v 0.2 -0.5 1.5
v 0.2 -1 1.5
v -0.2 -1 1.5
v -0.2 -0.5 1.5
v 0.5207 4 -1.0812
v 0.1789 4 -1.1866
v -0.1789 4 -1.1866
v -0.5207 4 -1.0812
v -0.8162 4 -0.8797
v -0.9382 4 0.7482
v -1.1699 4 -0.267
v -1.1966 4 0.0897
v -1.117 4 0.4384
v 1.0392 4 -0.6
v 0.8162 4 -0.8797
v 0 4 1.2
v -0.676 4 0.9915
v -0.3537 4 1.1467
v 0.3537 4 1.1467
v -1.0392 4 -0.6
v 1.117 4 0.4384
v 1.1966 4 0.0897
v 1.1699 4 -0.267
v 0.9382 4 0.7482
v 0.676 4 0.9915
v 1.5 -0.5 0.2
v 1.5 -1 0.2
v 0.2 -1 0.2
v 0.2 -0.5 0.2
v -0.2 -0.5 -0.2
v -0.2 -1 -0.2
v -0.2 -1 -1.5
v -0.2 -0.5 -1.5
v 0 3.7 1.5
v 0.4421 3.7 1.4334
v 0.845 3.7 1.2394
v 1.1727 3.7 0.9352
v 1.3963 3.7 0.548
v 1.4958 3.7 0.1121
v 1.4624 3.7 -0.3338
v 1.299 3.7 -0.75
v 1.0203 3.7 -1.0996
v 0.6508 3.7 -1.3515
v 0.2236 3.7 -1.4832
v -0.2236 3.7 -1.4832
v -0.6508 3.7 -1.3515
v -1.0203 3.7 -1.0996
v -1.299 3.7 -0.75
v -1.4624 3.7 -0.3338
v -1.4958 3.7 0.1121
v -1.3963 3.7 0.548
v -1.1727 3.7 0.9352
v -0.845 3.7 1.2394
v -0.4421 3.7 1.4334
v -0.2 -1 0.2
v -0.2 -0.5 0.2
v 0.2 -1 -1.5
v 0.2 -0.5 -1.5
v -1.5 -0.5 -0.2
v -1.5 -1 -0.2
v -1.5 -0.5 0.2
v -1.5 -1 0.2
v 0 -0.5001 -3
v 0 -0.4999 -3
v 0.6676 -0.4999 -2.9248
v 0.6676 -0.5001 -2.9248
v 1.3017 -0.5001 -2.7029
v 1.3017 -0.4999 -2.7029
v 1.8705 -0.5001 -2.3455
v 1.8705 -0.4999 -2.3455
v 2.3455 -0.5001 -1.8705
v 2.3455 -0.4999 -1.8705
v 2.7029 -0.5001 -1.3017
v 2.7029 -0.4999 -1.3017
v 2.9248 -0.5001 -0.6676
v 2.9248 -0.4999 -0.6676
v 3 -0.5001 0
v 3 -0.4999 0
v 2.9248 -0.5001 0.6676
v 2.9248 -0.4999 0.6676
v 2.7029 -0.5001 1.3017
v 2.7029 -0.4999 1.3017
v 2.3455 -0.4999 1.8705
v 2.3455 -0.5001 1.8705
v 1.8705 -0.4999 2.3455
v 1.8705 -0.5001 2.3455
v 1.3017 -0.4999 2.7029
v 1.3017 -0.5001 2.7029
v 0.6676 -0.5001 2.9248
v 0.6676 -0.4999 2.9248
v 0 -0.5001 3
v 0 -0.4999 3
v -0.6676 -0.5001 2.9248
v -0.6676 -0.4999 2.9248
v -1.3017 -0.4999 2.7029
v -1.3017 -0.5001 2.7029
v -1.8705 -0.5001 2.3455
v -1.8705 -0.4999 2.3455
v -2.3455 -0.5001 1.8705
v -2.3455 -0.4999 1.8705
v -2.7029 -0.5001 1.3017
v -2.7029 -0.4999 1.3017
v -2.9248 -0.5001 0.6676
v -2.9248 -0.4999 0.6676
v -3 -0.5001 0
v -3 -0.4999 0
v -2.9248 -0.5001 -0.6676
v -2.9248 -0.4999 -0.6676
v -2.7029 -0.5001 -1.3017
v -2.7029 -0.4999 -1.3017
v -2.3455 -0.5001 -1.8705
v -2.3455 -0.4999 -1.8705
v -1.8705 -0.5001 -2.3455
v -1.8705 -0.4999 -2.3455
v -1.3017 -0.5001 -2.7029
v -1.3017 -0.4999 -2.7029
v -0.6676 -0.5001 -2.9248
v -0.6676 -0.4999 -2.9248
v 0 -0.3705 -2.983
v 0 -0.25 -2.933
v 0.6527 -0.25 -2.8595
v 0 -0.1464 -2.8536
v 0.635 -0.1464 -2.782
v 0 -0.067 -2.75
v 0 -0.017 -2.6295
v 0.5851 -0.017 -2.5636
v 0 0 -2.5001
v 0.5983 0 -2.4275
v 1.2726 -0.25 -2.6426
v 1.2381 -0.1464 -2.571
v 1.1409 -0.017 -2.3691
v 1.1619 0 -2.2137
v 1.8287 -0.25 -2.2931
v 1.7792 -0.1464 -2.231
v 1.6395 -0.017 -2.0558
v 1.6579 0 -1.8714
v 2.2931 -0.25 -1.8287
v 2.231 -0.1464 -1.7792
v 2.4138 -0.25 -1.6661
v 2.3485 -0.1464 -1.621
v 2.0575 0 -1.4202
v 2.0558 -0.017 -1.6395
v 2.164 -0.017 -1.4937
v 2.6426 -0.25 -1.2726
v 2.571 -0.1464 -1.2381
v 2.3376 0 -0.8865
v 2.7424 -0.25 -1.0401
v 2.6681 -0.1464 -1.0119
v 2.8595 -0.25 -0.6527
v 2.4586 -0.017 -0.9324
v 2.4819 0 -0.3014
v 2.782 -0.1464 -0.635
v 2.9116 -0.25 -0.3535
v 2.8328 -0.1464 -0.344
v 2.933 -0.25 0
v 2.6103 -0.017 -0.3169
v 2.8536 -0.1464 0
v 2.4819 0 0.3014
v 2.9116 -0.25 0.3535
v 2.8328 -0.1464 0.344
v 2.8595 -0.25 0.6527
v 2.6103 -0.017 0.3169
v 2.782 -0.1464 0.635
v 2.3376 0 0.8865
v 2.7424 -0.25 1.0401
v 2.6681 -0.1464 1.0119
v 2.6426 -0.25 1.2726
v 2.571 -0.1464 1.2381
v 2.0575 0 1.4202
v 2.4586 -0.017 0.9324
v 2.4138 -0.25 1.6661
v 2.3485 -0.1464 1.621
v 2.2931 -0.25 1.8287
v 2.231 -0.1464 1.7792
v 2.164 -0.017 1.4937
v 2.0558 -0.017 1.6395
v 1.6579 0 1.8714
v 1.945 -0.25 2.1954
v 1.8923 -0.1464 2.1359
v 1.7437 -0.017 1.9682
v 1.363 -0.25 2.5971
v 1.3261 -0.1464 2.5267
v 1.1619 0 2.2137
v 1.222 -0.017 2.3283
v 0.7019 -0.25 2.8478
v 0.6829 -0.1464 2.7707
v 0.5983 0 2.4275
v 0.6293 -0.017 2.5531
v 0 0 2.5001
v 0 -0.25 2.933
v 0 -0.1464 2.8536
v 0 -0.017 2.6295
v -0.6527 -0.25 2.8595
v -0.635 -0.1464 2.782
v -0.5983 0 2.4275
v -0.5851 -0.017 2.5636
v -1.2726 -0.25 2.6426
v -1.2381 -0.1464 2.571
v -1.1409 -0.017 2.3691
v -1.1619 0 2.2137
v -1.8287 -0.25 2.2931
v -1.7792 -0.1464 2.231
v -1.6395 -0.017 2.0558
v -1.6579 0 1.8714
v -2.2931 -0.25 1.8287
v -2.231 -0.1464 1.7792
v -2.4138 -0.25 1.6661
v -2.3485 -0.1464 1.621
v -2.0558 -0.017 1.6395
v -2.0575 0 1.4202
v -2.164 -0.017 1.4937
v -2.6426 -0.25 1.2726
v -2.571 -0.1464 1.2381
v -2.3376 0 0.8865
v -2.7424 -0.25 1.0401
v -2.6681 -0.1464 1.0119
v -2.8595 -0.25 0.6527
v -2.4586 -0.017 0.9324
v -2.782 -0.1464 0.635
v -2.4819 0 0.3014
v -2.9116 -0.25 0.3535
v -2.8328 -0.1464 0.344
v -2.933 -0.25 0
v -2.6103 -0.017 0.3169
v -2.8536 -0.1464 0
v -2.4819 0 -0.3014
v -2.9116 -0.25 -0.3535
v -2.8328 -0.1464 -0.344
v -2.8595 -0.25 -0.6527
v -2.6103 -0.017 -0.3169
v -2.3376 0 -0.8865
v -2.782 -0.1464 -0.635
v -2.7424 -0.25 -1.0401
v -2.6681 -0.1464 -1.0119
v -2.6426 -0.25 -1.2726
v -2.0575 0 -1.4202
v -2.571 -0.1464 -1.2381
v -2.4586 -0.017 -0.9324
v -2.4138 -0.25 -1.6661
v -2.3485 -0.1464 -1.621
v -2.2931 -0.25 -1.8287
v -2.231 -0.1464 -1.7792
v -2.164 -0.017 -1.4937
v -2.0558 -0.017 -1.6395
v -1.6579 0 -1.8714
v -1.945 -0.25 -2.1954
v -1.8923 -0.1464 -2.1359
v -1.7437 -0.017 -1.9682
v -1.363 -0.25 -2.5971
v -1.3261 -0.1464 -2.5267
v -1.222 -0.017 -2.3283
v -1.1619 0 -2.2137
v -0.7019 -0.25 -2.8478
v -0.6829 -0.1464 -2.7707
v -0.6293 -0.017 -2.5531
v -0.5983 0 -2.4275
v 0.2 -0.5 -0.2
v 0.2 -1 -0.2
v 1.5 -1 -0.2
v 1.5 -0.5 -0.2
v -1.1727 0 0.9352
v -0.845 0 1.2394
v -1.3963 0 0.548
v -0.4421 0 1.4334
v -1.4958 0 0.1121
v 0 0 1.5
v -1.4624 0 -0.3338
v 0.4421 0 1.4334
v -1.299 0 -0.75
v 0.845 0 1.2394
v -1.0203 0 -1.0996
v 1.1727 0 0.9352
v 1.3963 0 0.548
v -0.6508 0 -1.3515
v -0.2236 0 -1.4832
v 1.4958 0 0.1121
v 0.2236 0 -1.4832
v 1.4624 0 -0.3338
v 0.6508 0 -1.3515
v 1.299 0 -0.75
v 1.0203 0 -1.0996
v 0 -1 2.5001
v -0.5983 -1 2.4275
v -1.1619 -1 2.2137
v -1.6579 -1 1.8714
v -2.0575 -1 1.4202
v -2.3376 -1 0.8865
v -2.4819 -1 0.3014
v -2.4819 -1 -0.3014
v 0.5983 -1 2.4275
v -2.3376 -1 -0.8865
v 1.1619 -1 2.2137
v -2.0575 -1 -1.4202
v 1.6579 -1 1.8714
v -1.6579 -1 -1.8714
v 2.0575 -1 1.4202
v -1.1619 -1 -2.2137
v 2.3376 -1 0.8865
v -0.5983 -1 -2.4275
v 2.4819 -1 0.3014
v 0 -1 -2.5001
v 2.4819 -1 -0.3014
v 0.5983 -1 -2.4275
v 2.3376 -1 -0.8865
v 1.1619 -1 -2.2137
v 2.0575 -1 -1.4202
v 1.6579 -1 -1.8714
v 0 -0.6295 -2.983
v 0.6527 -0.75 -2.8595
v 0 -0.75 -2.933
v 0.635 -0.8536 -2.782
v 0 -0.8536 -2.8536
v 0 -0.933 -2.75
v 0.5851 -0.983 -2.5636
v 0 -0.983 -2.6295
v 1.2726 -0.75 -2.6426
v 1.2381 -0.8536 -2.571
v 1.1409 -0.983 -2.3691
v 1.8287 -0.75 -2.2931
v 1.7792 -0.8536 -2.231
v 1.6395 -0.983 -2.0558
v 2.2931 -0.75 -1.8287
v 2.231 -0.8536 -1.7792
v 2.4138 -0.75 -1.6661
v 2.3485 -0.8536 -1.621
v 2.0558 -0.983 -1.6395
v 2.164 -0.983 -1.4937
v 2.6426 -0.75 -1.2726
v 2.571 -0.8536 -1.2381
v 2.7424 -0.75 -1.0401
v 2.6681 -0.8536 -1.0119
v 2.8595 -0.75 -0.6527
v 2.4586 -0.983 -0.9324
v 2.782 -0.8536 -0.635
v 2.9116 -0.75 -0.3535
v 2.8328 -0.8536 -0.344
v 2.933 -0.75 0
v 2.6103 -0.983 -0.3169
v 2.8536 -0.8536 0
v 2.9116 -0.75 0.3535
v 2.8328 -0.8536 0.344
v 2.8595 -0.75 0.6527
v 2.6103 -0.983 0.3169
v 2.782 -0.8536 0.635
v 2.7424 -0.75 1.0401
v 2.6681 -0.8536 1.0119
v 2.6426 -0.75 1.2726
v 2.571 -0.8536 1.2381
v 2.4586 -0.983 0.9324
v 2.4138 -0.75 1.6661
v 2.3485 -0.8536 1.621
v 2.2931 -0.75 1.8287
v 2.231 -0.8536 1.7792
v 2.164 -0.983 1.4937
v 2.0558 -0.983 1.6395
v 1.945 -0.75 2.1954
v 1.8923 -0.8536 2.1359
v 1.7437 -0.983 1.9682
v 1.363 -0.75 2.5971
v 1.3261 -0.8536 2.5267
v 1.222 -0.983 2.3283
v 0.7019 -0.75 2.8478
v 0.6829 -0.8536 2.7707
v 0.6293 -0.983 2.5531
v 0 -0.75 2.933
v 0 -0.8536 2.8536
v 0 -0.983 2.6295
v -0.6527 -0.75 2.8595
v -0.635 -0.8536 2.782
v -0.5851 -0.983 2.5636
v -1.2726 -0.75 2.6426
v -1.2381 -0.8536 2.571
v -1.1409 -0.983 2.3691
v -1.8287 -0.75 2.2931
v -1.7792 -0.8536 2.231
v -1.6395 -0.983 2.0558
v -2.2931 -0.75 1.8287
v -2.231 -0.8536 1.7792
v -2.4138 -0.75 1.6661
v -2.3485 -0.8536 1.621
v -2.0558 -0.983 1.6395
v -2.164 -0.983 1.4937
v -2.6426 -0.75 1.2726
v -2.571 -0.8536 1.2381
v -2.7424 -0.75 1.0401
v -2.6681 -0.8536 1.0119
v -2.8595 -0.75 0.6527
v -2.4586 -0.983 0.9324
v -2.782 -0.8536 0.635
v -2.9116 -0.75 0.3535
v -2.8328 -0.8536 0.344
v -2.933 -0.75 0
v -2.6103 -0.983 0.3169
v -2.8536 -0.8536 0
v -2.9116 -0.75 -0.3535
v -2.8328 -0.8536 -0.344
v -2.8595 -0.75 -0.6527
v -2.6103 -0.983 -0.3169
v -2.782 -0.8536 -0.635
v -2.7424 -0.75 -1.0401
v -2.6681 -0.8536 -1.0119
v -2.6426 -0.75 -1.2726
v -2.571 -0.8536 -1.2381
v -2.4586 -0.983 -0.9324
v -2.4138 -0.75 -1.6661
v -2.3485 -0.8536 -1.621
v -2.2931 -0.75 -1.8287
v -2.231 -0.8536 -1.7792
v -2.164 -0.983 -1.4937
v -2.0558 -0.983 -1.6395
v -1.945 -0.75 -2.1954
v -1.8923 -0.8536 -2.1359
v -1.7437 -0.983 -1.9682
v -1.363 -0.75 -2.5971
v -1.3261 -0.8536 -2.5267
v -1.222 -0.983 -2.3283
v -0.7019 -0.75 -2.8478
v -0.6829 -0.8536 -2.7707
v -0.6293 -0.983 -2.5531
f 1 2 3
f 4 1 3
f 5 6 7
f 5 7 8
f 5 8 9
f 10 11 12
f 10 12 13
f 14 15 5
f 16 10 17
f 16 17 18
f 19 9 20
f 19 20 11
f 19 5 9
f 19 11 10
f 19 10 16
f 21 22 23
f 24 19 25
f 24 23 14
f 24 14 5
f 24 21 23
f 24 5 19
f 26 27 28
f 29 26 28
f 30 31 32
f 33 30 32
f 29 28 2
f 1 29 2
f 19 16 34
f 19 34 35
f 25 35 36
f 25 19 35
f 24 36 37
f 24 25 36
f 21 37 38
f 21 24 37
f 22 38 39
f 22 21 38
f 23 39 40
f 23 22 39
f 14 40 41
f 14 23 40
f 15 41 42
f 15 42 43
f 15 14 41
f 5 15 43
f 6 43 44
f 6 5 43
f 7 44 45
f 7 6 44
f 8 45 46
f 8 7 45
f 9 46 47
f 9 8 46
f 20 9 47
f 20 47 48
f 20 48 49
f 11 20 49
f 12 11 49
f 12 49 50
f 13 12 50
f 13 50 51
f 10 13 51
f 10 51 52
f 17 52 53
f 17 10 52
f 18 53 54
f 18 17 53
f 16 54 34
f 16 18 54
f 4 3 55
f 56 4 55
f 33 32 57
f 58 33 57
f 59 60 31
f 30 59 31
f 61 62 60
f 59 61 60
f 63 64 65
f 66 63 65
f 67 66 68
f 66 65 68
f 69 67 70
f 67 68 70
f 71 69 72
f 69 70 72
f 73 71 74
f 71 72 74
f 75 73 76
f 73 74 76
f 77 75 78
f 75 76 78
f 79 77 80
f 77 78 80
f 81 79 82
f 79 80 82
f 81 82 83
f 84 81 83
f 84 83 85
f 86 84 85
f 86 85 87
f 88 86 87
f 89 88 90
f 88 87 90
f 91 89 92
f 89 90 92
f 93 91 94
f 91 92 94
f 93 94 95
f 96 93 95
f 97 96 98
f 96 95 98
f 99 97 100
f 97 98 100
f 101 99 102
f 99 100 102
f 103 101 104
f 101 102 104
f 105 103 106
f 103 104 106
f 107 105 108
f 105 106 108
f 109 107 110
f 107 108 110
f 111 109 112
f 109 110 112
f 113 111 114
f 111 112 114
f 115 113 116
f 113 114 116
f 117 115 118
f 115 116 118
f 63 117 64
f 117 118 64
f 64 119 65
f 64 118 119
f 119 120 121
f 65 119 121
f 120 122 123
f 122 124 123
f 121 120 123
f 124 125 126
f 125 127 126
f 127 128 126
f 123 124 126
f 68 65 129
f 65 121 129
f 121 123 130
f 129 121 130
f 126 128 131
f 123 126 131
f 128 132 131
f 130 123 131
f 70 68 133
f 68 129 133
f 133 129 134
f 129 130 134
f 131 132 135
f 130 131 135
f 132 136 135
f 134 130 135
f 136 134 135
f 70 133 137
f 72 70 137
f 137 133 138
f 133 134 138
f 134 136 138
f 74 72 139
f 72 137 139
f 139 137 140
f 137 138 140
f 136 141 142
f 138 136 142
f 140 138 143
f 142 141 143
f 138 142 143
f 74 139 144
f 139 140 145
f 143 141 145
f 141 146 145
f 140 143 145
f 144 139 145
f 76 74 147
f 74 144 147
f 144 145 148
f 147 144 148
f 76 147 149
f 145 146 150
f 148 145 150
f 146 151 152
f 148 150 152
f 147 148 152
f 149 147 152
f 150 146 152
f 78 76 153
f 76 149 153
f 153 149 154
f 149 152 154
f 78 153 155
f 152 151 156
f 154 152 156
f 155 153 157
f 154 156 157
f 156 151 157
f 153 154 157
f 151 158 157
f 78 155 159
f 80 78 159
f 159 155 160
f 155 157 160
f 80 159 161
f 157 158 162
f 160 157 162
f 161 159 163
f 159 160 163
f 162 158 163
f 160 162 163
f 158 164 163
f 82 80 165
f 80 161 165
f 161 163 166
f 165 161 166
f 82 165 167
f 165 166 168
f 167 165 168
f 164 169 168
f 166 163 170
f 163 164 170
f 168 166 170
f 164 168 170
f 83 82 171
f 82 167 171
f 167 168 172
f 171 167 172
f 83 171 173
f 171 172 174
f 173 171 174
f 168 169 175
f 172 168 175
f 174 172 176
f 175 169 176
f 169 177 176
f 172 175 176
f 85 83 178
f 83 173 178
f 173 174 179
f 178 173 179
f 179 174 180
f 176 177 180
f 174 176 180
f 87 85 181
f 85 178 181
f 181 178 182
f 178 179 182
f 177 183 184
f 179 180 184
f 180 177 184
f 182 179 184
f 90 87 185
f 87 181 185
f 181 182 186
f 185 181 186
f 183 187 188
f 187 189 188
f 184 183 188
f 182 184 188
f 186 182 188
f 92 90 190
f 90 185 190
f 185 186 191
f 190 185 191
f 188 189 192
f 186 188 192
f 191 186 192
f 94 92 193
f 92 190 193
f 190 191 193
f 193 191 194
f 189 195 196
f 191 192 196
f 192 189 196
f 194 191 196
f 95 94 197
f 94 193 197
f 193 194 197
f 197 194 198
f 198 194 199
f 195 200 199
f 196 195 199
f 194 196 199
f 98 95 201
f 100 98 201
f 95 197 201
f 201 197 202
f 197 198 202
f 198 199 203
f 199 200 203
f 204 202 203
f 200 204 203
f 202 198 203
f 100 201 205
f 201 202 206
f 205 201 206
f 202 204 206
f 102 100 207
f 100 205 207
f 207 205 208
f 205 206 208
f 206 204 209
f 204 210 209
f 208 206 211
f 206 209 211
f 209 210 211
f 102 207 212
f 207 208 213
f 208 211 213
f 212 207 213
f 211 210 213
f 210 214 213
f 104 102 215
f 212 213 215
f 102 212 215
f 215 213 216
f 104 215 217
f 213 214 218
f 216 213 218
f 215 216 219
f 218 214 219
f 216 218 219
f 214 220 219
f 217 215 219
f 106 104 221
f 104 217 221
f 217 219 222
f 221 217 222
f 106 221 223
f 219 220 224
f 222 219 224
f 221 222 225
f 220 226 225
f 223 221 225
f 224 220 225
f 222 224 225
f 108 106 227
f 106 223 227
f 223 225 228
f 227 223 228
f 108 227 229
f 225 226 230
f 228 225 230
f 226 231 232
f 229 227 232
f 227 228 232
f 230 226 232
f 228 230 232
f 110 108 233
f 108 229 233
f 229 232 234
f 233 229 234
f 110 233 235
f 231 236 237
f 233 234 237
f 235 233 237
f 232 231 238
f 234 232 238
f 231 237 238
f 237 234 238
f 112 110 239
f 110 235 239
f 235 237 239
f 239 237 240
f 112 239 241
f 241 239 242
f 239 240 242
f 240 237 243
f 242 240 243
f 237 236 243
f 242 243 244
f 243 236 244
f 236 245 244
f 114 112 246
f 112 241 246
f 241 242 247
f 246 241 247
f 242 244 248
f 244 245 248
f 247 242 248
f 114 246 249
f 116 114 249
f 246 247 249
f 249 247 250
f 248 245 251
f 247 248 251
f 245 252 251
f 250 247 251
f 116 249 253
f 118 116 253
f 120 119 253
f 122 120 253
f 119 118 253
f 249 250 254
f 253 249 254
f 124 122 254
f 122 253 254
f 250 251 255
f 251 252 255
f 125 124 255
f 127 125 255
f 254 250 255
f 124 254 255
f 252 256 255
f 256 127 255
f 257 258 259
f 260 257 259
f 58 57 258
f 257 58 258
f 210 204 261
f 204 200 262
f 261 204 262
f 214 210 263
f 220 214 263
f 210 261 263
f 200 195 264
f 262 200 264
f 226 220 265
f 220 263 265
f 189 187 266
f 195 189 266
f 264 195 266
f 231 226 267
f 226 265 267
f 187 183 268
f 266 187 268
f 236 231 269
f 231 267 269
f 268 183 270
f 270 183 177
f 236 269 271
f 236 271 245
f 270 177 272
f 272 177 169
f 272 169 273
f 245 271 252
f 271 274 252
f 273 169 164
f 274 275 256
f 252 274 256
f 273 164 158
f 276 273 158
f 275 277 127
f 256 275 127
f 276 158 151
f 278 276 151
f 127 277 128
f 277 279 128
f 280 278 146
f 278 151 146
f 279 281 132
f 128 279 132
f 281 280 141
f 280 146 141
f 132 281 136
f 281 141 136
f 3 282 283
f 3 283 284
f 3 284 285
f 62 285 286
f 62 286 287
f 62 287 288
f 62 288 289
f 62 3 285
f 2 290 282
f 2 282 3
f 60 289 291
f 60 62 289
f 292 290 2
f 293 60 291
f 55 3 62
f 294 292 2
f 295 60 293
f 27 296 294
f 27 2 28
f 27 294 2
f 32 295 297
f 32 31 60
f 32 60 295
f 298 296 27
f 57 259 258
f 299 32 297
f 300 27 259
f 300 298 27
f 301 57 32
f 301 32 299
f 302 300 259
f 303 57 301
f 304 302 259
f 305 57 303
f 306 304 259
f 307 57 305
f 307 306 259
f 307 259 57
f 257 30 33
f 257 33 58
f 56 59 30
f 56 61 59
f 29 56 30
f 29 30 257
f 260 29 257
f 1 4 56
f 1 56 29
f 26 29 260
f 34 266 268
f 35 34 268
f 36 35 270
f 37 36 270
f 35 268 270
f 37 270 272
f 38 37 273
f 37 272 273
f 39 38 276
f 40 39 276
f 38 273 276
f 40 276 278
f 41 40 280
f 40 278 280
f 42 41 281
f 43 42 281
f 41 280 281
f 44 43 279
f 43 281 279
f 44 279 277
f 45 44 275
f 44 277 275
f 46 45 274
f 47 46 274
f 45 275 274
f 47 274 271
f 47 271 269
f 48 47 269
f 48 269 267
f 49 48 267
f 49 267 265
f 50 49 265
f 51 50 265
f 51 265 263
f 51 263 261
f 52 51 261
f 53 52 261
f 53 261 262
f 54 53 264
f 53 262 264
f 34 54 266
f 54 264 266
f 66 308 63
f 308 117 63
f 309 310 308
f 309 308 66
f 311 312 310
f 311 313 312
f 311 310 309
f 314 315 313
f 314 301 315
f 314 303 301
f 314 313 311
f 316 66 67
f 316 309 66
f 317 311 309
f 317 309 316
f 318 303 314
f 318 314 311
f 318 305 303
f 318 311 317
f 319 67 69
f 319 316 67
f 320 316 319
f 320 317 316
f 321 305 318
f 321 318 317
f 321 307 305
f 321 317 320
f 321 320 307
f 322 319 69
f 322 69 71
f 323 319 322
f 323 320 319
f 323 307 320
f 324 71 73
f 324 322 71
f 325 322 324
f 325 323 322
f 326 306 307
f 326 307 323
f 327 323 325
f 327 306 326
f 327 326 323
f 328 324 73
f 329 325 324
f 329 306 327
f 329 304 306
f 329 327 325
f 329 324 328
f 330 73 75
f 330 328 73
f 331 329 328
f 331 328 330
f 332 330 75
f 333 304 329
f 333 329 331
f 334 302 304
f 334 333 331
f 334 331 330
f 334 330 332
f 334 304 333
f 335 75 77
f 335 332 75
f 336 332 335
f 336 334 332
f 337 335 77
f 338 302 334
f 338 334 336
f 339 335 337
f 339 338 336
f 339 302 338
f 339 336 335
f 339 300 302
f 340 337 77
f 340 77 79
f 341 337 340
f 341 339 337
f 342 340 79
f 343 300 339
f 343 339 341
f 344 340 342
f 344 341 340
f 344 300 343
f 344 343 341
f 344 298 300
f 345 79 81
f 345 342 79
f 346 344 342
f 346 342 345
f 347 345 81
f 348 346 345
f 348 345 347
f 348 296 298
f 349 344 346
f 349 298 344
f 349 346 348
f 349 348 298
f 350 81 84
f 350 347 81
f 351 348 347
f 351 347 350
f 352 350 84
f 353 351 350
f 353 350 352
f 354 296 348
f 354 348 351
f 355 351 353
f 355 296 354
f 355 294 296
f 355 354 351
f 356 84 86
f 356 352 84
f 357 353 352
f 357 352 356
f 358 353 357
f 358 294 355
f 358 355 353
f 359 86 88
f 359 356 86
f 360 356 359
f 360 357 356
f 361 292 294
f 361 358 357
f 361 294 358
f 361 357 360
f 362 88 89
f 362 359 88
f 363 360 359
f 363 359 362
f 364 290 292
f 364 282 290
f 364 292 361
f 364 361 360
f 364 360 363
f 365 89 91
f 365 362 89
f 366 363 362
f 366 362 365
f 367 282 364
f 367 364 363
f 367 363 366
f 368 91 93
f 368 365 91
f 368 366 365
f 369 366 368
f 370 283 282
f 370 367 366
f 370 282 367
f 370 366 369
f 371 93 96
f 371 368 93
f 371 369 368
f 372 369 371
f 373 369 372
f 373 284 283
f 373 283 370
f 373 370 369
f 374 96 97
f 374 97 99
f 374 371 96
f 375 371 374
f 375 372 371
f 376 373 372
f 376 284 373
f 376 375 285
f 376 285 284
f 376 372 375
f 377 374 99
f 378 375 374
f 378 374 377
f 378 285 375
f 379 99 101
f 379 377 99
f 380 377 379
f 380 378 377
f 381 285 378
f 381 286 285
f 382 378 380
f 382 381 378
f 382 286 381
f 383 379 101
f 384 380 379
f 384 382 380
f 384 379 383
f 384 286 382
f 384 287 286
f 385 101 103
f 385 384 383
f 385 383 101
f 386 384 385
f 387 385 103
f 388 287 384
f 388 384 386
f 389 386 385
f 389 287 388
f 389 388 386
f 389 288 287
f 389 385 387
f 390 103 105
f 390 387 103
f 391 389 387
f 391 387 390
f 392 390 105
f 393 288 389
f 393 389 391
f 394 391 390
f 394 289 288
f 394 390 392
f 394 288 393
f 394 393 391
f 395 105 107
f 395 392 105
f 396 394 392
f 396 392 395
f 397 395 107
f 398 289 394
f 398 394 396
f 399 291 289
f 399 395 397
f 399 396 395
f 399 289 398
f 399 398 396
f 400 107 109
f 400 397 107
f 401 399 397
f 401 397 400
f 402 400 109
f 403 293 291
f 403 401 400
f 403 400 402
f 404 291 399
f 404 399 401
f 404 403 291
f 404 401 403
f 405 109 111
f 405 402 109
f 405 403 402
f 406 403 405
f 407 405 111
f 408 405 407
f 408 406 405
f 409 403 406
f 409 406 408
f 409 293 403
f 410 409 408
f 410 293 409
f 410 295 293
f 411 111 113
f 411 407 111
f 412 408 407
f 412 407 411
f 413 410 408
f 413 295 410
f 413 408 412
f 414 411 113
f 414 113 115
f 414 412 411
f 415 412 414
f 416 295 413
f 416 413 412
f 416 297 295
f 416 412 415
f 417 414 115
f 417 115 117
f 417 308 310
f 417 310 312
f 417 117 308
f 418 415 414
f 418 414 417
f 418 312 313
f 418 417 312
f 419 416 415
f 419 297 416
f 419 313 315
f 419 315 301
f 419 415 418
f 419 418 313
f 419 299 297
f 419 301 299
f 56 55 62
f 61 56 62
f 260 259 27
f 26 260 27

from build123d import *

# Parameters (mm, degrees)
SKETCH_2_R          = 1.5
EXTRUDE_1_DEPTH     = 4
SKETCH_3_R          = 3
EXTRUDE_2_DEPTH     = 1
FILLET_1_R          = 0.5
CUT_EXTRUDE_2_DEPTH = 0.5
CHAMFER_1_SIZE      = 0.3


with BuildPart() as part:
    # 草图2 → 凸台-拉伸1 (new body)
    with BuildSketch(Plane(origin=(0, 0, 0), x_dir=(1, 0, 0), z_dir=(0, 1, 0))):
        with Locations(Location((0, 0, 0), (0, 0, 270))):
            Circle(SKETCH_2_R)
    extrude(amount=EXTRUDE_1_DEPTH)

    # 草图3 → 凸台-拉伸2 (add)
    with BuildSketch(Plane.XZ):
        with Locations(Location((0, 0, 0), (0, 0, 270))):
            Circle(SKETCH_3_R)
    extrude(amount=EXTRUDE_2_DEPTH)

    # 圆角1
    fillet_1_edges = [part.edges().sort_by_distance(p)[0] for p in [
        (0, 0, 3),
        (0, -1, 3),
    ]]
    fillet(fillet_1_edges, radius=FILLET_1_R - 0.0001)  # a hair under: the kernel refuses the full size

    # 草图4 → 切除-拉伸2 (cut)
    with BuildSketch(Plane.XZ.offset(1)):
        Polygon((-1.5, -0.2), (-0.2, -0.2), (-0.2, -1.5), (0.2, -1.5), (0.2, -0.2), (1.5, -0.2), (1.5, 0.2), (0.2, 0.2), (0.2, 1.5), (-0.2, 1.5), (-0.2, 0.2), (-1.5, 0.2), align=None)
    extrude(amount=-CUT_EXTRUDE_2_DEPTH, mode=Mode.SUBTRACT)

    # 倒角1
    chamfer_1_edges = [part.edges().sort_by_distance(p)[0] for p in [
        (0, 4, -1.5),
    ]]
    chamfer(chamfer_1_edges, length=CHAMFER_1_SIZE)


solid = part.part
